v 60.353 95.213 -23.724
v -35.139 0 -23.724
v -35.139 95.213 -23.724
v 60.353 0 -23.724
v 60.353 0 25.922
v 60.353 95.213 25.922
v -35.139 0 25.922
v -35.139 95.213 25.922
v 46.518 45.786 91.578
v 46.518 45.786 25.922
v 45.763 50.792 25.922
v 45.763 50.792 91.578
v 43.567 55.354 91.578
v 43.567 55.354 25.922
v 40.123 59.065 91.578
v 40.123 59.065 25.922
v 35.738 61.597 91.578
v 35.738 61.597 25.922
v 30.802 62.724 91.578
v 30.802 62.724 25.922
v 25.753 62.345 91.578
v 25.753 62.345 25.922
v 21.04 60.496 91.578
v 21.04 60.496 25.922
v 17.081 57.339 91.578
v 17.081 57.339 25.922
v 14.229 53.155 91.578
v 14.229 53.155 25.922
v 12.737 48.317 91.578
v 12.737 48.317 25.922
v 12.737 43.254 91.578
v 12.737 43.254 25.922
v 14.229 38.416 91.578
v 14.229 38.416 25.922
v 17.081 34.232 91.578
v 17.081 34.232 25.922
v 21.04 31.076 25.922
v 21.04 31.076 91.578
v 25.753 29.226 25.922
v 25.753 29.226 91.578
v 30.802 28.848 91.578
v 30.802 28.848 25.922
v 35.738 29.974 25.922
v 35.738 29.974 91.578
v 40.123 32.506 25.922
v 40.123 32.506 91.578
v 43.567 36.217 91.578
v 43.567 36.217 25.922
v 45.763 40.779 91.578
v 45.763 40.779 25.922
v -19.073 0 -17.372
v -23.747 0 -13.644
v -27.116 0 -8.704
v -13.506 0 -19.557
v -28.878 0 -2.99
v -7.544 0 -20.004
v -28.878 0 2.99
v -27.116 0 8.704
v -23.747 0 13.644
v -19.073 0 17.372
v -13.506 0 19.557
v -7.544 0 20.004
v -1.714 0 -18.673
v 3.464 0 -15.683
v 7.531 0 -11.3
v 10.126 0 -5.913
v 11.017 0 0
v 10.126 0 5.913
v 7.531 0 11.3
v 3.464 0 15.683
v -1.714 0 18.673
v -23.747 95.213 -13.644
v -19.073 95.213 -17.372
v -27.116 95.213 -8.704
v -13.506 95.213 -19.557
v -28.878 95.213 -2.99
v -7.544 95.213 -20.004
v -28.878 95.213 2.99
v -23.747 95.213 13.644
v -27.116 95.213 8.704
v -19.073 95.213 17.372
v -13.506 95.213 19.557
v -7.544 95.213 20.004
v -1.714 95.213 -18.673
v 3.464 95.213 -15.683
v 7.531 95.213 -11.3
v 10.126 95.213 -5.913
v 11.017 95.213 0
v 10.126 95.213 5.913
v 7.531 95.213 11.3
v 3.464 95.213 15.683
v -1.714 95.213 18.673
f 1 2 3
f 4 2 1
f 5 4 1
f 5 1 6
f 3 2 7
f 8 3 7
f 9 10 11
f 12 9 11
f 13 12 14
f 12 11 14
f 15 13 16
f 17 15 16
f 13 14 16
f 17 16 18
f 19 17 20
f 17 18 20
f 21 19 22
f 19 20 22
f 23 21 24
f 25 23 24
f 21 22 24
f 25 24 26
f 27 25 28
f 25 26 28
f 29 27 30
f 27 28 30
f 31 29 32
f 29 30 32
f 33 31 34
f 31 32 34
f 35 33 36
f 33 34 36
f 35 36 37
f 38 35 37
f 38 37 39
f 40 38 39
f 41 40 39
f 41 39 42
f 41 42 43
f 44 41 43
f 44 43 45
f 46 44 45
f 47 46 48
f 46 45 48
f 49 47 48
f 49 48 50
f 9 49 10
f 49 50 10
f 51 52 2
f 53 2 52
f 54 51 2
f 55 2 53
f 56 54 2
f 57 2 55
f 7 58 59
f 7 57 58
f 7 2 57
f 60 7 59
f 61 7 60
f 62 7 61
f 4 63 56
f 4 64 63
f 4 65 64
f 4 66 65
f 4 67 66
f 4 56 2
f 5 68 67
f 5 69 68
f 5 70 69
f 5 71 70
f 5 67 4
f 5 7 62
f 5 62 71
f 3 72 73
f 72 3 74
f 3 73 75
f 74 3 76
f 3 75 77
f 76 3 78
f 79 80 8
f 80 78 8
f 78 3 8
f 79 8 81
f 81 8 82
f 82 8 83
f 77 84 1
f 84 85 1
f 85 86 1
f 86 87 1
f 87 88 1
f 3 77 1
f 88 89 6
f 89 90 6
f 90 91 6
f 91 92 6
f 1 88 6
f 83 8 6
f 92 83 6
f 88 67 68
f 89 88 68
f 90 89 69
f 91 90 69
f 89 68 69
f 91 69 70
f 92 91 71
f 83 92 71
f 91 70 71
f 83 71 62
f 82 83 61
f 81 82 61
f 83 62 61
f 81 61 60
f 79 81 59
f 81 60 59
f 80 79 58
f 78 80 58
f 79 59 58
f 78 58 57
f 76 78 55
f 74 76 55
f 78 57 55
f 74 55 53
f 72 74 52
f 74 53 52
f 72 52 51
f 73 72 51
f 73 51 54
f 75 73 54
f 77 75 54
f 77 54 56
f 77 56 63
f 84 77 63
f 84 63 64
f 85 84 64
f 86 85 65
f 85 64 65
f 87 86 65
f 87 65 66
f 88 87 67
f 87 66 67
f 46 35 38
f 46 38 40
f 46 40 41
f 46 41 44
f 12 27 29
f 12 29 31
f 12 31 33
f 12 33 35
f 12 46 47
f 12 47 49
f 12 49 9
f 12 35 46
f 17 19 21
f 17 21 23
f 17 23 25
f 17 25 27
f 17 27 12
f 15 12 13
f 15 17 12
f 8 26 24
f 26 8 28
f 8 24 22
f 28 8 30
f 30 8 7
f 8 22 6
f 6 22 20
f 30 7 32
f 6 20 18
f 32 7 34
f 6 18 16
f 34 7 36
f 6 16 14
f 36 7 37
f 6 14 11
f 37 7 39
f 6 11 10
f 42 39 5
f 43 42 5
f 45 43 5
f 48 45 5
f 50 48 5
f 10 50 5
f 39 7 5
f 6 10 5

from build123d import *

# Parameters (mm, degrees)
F0_W     = 95.491998
F0_H     = 49.64583
F0_R     = 20.059681
F1_DEPTH = 95.213123
F2_R     = 16.985566
F3_DEPTH = 65.656334


with BuildPart() as f1:
    # F0 (on Front) → F1 (new body)
    with BuildSketch(Plane.XZ):
        with Locations((12.60728, 1.098985)):
            Rectangle(F0_W, F0_H)
        with Locations((-9.042681, 0)):
            Circle(F0_R, mode=Mode.SUBTRACT)
    extrude(amount=-F1_DEPTH)

    # F2 (on face) → F3 (join)
    with BuildSketch(Plane.XY.offset(25.9219)):
        with Locations((29.532403, 45.785598)):
            Circle(F2_R)
    extrude(amount=F3_DEPTH)


solid = f1.part
